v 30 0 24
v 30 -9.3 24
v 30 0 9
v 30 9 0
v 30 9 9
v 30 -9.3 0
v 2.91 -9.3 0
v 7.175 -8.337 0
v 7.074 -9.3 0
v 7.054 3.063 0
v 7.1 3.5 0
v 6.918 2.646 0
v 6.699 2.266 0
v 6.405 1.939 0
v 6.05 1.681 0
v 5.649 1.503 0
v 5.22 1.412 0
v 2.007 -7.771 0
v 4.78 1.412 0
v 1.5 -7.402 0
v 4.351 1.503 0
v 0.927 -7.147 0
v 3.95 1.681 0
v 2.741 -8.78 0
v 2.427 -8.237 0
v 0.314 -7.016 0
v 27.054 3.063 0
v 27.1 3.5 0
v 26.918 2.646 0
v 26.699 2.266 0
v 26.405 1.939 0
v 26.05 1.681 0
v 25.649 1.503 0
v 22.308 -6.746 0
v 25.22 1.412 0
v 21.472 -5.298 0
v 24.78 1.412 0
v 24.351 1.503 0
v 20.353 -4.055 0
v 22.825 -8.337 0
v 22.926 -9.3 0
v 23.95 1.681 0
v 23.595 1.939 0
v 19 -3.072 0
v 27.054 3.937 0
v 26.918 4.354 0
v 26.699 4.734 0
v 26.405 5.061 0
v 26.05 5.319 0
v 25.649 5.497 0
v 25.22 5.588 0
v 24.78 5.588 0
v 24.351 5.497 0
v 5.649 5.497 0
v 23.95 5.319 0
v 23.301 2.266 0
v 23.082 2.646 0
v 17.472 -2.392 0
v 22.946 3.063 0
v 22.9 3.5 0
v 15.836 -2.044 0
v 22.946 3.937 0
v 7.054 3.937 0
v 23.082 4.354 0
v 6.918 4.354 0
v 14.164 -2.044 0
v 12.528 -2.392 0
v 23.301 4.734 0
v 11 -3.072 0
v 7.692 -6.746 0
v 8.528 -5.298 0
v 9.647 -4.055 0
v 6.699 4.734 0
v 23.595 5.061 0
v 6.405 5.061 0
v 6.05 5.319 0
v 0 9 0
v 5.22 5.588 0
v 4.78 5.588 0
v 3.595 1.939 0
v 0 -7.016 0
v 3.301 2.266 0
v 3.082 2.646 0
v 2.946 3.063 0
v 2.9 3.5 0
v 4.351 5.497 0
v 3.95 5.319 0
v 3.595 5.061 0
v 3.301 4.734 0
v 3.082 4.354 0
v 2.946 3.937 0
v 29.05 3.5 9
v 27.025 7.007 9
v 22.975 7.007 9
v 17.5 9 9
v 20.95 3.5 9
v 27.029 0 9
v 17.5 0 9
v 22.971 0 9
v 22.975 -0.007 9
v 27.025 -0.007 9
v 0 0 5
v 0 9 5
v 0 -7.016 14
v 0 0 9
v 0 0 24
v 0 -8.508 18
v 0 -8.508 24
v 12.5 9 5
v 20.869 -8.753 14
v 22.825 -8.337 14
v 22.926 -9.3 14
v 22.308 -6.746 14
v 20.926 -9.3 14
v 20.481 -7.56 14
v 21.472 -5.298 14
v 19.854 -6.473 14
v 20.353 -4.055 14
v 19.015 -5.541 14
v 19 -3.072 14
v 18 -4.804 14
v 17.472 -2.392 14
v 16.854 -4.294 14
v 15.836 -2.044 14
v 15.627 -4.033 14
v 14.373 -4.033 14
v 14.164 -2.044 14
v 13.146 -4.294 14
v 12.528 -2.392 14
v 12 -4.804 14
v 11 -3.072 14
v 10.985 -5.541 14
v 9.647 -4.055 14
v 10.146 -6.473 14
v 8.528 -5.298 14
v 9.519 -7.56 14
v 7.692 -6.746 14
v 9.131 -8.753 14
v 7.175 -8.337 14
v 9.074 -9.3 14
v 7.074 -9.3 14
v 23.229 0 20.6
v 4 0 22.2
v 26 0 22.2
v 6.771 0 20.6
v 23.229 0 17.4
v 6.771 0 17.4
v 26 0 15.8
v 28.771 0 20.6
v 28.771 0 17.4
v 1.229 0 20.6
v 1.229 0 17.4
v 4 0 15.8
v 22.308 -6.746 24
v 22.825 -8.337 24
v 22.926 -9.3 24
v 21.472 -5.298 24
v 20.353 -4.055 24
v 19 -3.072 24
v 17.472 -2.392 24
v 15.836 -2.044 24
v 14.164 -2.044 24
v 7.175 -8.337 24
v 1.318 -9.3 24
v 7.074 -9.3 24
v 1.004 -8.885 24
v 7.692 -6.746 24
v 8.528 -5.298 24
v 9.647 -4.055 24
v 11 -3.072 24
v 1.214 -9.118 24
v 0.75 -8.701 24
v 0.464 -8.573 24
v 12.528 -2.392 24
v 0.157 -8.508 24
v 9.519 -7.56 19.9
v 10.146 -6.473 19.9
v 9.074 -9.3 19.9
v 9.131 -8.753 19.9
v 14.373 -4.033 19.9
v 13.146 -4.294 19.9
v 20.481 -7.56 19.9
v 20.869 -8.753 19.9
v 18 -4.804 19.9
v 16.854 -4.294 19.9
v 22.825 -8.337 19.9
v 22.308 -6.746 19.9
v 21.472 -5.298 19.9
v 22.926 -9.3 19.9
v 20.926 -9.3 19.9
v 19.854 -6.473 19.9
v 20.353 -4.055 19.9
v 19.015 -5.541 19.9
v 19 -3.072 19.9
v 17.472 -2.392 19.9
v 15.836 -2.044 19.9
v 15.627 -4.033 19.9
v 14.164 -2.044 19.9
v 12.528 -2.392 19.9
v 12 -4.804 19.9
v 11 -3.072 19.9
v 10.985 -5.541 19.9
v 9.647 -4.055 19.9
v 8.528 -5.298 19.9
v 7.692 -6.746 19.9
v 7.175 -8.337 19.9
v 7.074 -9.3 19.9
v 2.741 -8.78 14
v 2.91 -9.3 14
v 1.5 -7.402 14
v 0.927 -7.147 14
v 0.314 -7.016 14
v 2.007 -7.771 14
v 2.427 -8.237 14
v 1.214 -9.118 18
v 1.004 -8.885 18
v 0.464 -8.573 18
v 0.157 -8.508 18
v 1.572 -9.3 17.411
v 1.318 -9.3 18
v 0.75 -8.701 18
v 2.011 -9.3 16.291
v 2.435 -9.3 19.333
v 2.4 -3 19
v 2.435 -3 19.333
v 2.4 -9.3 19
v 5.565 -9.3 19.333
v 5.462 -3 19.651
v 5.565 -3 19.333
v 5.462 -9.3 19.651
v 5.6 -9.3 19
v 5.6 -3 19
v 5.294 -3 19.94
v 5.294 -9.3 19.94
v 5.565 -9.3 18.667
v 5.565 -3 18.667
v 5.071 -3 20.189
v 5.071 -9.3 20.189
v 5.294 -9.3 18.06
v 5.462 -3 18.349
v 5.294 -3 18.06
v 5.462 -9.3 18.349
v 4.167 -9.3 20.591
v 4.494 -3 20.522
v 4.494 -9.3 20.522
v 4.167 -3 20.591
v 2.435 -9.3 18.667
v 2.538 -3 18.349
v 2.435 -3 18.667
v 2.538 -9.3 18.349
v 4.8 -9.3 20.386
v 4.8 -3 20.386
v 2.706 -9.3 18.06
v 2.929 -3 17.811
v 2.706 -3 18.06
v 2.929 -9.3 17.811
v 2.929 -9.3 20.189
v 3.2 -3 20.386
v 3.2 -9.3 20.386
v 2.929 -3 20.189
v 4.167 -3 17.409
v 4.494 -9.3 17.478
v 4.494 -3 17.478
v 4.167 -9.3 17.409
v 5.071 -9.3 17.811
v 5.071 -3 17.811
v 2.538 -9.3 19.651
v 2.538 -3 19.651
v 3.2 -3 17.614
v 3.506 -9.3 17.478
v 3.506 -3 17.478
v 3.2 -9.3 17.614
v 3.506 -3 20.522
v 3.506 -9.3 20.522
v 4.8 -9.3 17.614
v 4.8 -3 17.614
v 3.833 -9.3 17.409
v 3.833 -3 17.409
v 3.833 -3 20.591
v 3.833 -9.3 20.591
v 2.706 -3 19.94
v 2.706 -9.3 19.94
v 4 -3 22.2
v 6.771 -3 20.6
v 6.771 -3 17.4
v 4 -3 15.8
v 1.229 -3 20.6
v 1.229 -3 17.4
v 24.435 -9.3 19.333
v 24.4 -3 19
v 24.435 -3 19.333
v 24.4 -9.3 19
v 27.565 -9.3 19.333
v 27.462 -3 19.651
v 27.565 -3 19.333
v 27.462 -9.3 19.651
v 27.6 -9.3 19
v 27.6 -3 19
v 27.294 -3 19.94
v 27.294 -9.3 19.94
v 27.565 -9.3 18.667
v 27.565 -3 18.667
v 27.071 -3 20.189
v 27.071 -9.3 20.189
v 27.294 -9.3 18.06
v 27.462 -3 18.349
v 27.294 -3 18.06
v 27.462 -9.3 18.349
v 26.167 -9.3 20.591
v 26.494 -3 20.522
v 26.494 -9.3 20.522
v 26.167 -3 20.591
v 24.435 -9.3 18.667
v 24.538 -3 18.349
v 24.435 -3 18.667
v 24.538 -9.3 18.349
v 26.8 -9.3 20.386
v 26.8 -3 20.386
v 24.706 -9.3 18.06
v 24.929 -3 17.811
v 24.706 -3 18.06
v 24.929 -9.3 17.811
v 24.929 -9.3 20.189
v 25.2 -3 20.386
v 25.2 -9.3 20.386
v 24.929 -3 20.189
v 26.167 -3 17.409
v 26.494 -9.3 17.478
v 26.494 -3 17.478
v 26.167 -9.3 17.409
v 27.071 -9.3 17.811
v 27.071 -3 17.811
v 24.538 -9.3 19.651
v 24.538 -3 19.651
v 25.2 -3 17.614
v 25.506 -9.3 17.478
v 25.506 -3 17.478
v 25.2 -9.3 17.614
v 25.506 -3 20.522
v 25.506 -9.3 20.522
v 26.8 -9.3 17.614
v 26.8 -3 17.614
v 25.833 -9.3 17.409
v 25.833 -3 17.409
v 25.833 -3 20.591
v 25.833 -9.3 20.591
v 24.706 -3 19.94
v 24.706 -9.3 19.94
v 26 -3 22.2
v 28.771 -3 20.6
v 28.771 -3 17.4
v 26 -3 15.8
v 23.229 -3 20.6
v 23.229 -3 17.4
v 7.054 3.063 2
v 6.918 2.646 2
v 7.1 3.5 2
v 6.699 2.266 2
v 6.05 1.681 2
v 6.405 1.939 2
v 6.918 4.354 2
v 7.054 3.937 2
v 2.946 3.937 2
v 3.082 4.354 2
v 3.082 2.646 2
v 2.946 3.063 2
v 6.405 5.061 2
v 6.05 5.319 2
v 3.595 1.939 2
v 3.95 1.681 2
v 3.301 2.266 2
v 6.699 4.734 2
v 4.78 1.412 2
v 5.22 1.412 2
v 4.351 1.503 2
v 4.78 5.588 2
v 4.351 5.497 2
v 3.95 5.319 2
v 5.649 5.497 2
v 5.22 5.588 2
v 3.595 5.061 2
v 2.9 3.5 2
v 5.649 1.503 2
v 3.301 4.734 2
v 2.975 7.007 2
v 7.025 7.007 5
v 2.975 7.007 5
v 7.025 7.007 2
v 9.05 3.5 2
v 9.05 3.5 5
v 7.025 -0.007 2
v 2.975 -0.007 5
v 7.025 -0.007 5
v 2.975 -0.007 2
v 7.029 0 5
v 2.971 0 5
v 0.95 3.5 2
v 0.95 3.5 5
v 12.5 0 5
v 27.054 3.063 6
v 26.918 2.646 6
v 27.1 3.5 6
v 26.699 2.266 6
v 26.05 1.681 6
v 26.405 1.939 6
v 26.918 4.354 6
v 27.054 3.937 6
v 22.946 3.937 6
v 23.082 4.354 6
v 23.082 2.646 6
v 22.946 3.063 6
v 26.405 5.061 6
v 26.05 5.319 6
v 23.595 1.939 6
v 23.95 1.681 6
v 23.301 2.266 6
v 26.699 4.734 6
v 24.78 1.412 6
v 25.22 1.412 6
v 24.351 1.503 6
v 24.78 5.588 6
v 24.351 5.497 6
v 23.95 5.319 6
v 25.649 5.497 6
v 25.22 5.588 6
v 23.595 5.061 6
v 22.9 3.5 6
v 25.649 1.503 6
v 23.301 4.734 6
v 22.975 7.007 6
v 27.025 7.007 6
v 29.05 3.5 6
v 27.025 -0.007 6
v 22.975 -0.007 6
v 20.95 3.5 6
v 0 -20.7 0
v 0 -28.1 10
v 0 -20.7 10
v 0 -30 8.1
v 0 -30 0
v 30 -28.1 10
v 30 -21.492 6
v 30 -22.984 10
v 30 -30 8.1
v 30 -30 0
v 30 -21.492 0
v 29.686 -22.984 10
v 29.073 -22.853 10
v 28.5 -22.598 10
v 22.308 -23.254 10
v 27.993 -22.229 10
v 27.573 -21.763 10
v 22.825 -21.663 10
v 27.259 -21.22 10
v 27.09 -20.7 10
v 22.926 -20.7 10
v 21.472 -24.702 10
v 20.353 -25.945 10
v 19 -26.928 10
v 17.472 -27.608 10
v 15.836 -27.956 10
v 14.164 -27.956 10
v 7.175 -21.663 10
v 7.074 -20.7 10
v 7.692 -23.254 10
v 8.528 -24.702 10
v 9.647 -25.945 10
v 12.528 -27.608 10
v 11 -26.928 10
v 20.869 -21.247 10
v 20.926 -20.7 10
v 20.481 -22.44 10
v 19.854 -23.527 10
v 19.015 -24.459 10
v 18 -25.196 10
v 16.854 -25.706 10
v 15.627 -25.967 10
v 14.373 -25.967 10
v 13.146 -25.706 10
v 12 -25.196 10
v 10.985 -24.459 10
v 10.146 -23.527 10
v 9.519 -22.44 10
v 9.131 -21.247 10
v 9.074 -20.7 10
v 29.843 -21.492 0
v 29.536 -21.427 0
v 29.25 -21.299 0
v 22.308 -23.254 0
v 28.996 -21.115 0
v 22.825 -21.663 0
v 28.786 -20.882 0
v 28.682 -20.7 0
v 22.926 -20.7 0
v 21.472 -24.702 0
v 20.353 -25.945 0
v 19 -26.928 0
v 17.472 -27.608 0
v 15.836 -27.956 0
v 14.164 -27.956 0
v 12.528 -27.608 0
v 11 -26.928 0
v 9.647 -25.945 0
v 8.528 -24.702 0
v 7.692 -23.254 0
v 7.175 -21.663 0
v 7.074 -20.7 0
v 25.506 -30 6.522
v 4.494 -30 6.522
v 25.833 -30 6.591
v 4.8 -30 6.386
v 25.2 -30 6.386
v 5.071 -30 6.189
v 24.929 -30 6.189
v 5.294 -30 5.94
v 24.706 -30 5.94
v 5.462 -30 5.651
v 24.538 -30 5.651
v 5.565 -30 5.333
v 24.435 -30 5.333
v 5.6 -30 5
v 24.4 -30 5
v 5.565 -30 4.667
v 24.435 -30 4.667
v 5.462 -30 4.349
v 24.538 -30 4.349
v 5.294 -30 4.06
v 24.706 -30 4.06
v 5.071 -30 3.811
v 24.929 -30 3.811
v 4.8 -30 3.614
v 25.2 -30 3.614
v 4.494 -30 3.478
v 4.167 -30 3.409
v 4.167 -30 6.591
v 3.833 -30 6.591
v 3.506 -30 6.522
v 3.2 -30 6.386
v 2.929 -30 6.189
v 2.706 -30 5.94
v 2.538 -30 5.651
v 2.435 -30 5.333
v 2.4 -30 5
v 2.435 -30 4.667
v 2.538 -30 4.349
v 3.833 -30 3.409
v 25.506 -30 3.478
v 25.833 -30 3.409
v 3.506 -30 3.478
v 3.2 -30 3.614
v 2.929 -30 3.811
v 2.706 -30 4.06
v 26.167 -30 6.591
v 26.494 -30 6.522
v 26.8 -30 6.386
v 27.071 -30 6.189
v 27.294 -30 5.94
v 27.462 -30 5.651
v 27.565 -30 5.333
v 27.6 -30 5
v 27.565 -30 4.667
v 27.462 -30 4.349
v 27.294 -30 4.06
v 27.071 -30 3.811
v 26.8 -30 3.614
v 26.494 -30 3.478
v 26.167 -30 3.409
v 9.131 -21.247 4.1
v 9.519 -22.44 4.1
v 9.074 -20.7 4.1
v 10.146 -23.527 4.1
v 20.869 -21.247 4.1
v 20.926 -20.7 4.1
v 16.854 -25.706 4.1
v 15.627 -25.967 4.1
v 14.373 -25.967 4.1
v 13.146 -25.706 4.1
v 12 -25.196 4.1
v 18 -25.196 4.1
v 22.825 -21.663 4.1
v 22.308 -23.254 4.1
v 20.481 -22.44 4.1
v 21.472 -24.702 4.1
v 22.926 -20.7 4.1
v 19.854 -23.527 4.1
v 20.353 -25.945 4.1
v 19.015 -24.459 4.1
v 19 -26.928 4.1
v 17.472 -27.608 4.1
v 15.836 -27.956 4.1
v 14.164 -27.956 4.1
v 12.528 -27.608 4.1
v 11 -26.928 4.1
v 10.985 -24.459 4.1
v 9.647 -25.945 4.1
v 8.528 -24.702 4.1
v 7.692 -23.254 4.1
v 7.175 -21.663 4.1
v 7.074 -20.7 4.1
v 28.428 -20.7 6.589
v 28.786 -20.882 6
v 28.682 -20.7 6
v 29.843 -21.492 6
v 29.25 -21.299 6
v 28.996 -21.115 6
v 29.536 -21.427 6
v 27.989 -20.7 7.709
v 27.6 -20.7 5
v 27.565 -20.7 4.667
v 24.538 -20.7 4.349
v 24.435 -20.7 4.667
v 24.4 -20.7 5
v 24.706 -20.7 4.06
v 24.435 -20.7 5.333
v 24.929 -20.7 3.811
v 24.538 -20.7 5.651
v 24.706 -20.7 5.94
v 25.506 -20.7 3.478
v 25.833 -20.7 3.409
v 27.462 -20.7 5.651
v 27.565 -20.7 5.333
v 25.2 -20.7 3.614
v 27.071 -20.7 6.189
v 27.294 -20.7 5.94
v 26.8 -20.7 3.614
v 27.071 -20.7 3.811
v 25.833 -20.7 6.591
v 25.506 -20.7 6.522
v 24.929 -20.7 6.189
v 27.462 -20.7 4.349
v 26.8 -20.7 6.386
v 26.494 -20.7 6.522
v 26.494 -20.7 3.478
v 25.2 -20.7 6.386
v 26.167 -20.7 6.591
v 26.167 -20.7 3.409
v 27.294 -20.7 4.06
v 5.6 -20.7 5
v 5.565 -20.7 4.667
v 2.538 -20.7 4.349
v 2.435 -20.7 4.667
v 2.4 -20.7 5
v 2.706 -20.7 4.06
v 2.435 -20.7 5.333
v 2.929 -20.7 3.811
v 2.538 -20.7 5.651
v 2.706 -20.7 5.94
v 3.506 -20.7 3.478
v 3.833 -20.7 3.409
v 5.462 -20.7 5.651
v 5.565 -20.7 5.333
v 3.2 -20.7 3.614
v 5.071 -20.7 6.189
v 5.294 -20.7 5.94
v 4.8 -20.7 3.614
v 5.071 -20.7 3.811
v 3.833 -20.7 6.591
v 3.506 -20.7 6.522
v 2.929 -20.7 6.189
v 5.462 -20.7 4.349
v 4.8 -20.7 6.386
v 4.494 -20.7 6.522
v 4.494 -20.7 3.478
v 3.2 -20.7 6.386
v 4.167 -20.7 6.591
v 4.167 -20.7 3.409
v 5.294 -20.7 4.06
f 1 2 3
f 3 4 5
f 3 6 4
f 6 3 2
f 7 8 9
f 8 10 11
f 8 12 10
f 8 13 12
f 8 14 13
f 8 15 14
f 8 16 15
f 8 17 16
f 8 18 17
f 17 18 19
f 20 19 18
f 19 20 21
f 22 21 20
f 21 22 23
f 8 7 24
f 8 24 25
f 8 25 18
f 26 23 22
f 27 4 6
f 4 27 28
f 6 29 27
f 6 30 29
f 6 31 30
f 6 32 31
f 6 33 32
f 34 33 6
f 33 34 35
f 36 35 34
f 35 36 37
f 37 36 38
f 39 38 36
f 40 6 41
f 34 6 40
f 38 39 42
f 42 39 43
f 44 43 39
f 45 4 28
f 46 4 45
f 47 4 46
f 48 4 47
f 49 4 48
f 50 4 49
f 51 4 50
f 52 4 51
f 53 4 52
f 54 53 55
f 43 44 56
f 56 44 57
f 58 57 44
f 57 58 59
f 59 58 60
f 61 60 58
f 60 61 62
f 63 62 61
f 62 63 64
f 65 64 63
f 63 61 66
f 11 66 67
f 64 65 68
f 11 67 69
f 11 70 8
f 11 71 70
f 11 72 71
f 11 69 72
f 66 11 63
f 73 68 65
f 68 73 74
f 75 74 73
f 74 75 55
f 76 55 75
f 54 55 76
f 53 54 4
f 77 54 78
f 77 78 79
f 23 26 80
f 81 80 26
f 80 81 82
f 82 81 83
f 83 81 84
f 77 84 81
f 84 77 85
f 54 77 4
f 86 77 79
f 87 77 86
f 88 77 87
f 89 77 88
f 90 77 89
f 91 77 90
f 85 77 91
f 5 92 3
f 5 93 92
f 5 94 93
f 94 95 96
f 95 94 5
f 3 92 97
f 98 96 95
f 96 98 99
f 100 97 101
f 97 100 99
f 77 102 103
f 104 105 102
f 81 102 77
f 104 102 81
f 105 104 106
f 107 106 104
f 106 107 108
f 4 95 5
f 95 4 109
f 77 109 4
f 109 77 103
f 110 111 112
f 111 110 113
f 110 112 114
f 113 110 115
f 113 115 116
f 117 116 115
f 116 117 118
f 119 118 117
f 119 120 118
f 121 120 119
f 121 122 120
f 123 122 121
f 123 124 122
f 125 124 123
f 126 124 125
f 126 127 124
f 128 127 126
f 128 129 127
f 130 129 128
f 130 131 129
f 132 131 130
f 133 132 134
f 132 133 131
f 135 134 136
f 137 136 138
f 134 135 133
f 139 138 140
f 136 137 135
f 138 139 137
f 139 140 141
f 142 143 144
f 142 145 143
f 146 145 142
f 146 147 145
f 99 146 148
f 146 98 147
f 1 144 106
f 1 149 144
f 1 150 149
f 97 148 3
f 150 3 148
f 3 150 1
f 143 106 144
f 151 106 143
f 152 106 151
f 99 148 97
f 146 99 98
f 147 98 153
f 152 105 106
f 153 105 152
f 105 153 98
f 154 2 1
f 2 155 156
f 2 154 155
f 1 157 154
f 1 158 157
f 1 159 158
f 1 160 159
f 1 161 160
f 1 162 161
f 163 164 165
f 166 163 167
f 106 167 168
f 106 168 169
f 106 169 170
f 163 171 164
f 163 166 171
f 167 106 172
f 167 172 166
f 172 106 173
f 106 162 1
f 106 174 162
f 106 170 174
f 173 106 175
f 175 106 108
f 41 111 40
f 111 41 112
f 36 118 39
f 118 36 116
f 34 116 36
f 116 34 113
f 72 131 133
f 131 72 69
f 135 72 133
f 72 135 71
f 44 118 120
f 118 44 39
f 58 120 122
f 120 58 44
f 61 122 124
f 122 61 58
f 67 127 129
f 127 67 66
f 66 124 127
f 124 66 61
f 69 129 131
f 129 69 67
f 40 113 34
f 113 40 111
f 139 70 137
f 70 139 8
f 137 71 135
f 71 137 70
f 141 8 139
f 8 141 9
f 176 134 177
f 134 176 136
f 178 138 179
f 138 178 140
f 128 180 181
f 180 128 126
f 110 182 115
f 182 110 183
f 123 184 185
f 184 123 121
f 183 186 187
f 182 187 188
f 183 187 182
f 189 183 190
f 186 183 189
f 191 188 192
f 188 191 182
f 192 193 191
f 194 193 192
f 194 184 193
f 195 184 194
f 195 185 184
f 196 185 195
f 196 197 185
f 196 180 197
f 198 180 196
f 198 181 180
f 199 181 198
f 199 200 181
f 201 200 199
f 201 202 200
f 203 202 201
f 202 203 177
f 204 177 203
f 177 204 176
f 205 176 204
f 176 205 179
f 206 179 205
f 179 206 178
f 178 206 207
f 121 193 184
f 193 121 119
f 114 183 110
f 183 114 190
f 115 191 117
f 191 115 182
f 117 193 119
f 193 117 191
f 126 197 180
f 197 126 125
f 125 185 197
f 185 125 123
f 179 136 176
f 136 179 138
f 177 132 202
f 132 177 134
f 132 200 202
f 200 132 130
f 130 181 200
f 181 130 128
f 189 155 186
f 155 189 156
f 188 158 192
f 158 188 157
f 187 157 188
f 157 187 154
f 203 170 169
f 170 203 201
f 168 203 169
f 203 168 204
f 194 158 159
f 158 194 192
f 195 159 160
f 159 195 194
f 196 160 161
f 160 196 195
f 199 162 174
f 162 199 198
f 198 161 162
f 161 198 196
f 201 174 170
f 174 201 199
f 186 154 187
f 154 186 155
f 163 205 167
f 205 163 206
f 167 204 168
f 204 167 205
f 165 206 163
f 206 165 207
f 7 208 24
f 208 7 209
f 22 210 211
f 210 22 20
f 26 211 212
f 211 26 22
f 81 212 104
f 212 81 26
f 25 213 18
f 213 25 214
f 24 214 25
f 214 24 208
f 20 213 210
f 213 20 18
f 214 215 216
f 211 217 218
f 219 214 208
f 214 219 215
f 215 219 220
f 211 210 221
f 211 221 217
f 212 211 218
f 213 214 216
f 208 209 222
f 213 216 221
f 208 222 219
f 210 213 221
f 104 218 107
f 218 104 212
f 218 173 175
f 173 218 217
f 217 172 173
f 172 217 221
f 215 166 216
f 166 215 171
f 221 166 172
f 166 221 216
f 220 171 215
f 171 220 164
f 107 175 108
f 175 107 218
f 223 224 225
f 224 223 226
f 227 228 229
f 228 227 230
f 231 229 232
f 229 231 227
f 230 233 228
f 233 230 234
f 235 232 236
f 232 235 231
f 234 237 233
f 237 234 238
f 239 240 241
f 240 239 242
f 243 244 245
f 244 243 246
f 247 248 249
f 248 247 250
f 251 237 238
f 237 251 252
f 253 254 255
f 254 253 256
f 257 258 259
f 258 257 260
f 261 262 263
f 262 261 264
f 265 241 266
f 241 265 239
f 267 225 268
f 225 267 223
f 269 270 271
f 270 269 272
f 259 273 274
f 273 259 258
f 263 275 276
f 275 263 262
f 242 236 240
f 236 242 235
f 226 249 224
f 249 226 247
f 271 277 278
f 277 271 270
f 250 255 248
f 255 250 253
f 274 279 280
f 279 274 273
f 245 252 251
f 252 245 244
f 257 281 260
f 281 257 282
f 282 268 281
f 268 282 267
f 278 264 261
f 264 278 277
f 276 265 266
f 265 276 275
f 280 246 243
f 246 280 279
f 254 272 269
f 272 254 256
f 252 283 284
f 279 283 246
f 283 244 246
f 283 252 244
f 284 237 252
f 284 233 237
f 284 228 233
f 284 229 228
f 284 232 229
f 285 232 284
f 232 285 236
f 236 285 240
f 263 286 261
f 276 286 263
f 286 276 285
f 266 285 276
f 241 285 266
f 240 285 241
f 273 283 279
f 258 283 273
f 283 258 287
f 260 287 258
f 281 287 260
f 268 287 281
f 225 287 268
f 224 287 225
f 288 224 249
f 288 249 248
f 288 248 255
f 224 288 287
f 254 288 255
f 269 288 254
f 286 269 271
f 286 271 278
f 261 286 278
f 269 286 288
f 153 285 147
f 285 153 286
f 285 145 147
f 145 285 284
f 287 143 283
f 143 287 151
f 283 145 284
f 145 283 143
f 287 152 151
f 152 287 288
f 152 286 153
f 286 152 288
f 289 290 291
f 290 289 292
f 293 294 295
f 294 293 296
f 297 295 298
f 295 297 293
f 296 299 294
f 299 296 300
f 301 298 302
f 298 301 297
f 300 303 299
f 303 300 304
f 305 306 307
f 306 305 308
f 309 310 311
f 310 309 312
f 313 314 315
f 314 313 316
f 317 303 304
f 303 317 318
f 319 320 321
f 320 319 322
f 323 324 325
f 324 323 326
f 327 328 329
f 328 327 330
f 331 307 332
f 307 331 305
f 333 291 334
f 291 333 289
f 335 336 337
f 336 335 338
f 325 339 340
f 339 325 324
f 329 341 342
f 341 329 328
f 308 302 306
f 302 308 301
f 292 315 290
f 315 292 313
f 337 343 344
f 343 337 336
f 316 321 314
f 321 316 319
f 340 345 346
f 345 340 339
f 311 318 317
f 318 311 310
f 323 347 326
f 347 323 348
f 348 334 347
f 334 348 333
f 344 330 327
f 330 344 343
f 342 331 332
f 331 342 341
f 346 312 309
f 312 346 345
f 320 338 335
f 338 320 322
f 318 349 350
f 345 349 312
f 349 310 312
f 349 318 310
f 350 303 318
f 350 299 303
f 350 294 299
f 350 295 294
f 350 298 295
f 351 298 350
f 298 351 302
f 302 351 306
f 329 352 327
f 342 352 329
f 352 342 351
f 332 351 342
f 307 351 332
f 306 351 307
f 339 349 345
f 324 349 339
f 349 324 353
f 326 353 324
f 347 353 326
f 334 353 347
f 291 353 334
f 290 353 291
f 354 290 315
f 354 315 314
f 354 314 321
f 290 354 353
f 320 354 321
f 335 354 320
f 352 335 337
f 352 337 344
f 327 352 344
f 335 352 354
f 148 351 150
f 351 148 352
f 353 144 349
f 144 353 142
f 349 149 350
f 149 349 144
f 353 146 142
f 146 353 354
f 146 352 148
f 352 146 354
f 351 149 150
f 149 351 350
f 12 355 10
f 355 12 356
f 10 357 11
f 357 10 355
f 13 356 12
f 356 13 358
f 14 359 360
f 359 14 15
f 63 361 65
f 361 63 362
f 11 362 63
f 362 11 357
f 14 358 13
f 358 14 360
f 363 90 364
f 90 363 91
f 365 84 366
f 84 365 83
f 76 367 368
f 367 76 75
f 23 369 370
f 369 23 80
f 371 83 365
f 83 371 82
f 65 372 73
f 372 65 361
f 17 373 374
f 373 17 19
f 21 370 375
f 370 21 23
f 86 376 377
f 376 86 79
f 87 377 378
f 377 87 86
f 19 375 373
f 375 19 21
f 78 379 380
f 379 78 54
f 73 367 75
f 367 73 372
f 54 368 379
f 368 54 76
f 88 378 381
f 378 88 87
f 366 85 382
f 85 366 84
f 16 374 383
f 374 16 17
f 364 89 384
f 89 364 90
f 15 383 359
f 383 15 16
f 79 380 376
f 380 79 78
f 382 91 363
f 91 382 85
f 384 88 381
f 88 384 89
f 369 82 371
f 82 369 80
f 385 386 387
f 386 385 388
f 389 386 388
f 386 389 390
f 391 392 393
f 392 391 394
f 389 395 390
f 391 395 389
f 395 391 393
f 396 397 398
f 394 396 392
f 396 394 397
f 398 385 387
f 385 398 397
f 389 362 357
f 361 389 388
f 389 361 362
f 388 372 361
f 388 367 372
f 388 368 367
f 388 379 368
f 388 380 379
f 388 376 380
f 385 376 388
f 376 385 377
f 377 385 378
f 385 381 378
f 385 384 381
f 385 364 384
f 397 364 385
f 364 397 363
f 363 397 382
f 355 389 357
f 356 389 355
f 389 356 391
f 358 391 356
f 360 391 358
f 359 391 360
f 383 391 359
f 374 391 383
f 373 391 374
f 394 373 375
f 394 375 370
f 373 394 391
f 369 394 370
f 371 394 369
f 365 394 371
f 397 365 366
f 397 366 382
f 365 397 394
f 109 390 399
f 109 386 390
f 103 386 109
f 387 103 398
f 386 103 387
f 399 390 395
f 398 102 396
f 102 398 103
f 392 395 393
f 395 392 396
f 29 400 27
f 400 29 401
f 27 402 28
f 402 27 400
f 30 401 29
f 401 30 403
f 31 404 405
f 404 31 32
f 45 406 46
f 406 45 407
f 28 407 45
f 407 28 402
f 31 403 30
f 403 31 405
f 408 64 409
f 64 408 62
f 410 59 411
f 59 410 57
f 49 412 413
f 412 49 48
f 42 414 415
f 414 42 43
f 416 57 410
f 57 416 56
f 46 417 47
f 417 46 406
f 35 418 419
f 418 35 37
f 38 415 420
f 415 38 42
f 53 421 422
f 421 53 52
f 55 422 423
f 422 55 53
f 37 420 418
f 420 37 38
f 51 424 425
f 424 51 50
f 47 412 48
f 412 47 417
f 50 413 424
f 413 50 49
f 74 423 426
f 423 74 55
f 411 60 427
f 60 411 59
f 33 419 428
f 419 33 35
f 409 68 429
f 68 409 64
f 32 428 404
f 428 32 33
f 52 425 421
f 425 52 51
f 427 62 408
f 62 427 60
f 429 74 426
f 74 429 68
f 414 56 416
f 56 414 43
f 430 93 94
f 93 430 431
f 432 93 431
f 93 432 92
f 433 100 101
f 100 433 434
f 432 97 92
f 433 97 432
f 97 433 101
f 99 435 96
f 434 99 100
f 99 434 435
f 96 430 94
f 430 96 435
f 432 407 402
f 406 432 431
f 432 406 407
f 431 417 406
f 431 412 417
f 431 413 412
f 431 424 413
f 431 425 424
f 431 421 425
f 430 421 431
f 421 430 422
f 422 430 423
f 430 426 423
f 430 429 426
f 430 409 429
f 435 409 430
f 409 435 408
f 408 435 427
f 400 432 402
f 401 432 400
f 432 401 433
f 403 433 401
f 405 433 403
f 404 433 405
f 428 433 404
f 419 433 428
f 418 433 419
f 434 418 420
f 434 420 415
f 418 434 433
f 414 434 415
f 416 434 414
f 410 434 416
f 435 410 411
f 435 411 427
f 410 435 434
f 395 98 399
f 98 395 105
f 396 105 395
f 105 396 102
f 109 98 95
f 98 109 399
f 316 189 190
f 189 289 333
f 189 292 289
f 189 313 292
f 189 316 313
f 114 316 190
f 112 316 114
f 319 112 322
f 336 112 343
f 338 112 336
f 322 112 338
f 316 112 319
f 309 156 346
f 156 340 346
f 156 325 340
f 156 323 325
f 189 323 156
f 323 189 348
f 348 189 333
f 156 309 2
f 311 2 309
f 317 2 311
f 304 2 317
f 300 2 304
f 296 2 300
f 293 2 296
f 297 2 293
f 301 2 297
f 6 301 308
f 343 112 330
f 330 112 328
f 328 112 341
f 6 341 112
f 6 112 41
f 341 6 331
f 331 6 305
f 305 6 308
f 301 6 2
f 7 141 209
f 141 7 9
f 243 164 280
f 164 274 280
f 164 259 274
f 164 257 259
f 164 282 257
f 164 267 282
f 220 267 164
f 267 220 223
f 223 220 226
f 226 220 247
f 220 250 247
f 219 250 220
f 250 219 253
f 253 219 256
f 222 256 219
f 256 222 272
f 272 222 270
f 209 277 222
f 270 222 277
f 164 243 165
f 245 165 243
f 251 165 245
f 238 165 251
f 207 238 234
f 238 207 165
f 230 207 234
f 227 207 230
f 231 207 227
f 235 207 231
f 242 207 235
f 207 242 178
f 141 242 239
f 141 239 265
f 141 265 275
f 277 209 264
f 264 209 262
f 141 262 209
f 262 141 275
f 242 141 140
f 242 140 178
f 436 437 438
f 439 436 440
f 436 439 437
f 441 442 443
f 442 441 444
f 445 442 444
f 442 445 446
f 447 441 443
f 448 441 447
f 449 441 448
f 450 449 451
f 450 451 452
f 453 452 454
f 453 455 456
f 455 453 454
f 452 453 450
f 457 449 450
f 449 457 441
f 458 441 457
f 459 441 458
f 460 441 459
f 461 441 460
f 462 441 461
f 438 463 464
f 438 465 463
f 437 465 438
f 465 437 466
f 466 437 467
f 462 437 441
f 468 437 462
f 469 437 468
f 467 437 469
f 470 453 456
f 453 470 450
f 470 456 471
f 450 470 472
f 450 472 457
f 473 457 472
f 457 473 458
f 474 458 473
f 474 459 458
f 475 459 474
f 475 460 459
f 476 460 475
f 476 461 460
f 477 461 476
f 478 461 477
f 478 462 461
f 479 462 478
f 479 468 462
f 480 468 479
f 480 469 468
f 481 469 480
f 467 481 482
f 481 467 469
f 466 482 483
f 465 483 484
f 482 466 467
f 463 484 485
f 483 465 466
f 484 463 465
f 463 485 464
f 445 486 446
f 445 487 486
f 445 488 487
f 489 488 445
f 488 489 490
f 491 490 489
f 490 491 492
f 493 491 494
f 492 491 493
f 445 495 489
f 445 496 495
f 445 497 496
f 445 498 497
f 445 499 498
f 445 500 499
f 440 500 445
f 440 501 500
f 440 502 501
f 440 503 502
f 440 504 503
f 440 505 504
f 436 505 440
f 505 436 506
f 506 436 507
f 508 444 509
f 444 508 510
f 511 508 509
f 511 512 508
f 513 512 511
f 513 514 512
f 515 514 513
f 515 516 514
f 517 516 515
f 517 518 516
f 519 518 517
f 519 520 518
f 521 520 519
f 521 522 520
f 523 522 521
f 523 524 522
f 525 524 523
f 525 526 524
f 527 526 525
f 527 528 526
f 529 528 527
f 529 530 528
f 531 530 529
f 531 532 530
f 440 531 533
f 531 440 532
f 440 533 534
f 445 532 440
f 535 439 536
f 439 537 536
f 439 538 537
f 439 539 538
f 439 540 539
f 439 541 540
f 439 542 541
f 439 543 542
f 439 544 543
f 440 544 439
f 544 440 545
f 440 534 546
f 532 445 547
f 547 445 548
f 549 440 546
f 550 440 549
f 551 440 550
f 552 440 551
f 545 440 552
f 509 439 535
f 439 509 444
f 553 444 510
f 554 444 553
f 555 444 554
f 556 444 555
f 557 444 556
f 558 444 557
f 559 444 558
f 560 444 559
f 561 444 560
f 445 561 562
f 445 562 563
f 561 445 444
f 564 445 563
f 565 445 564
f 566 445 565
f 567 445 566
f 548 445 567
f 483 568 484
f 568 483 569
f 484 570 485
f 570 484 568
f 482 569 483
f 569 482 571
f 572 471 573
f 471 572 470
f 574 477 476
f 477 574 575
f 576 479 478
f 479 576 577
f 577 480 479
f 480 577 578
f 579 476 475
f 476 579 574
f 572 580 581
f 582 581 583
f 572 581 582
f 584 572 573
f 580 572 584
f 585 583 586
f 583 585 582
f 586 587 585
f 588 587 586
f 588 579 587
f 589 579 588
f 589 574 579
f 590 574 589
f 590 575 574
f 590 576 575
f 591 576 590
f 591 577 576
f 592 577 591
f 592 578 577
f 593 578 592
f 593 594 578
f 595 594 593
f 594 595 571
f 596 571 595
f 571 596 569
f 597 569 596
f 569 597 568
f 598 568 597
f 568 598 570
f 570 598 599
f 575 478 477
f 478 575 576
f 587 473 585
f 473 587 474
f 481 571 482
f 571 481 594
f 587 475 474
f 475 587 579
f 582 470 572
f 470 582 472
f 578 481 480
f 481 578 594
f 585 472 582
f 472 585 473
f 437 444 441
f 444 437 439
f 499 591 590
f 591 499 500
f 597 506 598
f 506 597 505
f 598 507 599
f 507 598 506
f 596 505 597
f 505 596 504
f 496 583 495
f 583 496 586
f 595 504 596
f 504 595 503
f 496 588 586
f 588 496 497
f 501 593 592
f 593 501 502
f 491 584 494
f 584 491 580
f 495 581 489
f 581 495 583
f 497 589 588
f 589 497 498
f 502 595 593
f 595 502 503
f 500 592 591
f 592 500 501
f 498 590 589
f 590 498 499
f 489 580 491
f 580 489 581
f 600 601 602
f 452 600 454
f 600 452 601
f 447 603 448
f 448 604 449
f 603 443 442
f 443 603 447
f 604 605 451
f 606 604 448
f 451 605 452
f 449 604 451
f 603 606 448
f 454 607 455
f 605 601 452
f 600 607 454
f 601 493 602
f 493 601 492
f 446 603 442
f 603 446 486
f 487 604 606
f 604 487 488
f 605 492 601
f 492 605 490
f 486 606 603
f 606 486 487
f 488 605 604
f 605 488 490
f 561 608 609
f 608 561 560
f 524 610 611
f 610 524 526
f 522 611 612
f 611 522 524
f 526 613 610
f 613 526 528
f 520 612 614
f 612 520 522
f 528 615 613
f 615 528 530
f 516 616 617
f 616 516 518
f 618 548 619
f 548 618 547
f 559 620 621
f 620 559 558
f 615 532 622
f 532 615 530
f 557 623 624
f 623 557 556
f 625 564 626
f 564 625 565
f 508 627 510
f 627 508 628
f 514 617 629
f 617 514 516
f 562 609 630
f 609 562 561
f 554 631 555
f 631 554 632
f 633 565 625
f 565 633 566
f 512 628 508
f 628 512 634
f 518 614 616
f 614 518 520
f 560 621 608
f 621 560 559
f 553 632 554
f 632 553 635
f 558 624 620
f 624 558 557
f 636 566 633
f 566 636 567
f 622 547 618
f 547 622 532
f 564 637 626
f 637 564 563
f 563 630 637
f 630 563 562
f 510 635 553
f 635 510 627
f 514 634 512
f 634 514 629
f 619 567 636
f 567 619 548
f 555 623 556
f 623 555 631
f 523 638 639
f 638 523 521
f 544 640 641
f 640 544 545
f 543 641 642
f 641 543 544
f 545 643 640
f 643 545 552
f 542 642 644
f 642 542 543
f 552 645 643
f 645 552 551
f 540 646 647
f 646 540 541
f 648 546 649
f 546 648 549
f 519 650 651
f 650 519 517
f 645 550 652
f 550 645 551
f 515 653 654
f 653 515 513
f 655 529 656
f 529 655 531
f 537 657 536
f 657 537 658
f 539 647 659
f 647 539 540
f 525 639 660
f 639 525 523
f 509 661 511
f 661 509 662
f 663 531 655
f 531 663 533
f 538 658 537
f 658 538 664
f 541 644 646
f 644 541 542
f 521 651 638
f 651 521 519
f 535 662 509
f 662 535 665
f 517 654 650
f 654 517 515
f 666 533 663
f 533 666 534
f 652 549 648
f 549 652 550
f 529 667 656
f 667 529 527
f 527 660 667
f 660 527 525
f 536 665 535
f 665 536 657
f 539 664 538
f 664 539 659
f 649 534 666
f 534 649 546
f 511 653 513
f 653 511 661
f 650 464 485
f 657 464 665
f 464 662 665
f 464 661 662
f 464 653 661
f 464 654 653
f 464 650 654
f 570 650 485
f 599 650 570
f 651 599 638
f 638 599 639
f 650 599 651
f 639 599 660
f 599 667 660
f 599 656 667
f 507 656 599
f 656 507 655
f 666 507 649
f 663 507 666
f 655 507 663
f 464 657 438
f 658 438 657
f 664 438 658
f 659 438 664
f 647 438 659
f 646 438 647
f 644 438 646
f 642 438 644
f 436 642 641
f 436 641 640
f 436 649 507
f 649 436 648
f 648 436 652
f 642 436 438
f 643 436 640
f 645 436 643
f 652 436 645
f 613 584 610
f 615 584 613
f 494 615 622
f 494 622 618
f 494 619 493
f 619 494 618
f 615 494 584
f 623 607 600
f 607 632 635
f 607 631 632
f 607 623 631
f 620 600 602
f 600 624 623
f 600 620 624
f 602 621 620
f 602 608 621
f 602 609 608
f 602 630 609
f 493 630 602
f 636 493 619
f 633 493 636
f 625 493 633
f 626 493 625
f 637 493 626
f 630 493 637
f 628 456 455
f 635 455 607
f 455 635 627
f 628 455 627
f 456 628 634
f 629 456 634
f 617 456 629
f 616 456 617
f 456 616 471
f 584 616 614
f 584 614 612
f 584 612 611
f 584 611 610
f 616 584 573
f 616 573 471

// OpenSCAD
// Fabrikator 2 mini E3D v6 hotend mount
//
// Copyright (c) 2017 Janne Grunau
//
// This work is licensed under the Creative Commons Attribution-ShareAlike 4.0 International License.
// To view a copy of this license, visit http://creativecommons.org/licenses/by-sa/4.0/.

 module prism(l, w, h){
       polyhedron(
               points=[[0,0,0], [l,0,0], [l,w,0], [0,w,0], [0,w,h], [l,w,h]],
               faces=[[0,1,2,3],[5,4,3,2],[0,4,5,1],[0,3,4],[5,2,1]]
               );
}

module block() {
    union() {
    translate([0,-9,15]) cube([30,19, 9]);
    translate([0, 0,10]) cube([30,10, 5]);
    translate([0, 0, 0]) cube([30,20,10]);
    }
}

module object() {
difference() {
    block();
    union() {
        translate([15,10,10]) cylinder(r=8, $fs=0.05, h=20);
        translate([15,10,4.1]) cylinder(r=6, $fs=0.05, h=5.9);

        translate([30,18,10.1]) rotate([0,180,0]) prism(30,2,2);

        //translate([15 - 12 / 2, 0, 0]) cube([12,8, 5.9]);
        translate([15,10,-2]) cylinder(r=8, $fs=0.05, h=6.1);
        //translate([15 - 16/2, 0, 5.9]) cube([16,8, 4.1]);
        //translate([15 - 8/2, 0, 5.9]) cube([8,8, 4.1]);

        // cables
        translate([ 0,10,17]) cylinder(r=3, h=14, $fs=0.1, center=true);
        translate([ 0,10,8]) cylinder(r1=1.5, r2=3, h=4, $fs=0.1, center=true);
        translate([ 0,10,3]) cylinder(r=1.5, h=6, $fs=0.1, center=true);

        // hotend screw + nut holes
        translate([4,11.5,5]) rotate([-90,0,0]) cylinder(r=1.6, h=17, $fs=0.05, center=true);
        translate([4,1.5,5]) rotate([-90,30,0]) cylinder(r=3.2, h=3, $fn=6, center=true);
        translate([26,11.5,5]) rotate([-90,0,0]) cylinder(r=1.6, h=17, $fs=0.05, center=true);
        translate([26,1.5,5]) rotate([-90,30,0]) cylinder(r=3.2, h=3, $fn=6, center=true);

        // mount screw + nut holes
        translate([ 5,-3.5,21]) cylinder(r=2.1, h=6, $fs=0.1, center=true);
        translate([ 5,-3.5,20.5]) cylinder(r=4.05, h=3, $fn=6, center=true);
        translate([25,-3.5,20.5]) cylinder(r=2.1, h=11, $fs=0.1, center=true);
        translate([25,-3.5,16.5]) cylinder(r=4.05, h=3, $fn=6, center=true);

        // y stepper screw clearance
        translate([0,-9,15]) cube([12.5,9,4]);
        translate([17.5,-9.1,15]) rotate([0,0,90]) prism(9.1,5,4);
    }
}
}

module mount() {
    difference() {
        object();
        translate([0,9.3,0]) cube([30,10.7,30]);
    }
}

module clamp() {
    difference() {
        object();
        translate([0,-9,-2]) cube([30,19.7,30]);
    }
}

rotate([180,0,0]) translate([0,0,-24])  mount();
rotate([0,0,180]) translate([-30,10,0]) clamp();
